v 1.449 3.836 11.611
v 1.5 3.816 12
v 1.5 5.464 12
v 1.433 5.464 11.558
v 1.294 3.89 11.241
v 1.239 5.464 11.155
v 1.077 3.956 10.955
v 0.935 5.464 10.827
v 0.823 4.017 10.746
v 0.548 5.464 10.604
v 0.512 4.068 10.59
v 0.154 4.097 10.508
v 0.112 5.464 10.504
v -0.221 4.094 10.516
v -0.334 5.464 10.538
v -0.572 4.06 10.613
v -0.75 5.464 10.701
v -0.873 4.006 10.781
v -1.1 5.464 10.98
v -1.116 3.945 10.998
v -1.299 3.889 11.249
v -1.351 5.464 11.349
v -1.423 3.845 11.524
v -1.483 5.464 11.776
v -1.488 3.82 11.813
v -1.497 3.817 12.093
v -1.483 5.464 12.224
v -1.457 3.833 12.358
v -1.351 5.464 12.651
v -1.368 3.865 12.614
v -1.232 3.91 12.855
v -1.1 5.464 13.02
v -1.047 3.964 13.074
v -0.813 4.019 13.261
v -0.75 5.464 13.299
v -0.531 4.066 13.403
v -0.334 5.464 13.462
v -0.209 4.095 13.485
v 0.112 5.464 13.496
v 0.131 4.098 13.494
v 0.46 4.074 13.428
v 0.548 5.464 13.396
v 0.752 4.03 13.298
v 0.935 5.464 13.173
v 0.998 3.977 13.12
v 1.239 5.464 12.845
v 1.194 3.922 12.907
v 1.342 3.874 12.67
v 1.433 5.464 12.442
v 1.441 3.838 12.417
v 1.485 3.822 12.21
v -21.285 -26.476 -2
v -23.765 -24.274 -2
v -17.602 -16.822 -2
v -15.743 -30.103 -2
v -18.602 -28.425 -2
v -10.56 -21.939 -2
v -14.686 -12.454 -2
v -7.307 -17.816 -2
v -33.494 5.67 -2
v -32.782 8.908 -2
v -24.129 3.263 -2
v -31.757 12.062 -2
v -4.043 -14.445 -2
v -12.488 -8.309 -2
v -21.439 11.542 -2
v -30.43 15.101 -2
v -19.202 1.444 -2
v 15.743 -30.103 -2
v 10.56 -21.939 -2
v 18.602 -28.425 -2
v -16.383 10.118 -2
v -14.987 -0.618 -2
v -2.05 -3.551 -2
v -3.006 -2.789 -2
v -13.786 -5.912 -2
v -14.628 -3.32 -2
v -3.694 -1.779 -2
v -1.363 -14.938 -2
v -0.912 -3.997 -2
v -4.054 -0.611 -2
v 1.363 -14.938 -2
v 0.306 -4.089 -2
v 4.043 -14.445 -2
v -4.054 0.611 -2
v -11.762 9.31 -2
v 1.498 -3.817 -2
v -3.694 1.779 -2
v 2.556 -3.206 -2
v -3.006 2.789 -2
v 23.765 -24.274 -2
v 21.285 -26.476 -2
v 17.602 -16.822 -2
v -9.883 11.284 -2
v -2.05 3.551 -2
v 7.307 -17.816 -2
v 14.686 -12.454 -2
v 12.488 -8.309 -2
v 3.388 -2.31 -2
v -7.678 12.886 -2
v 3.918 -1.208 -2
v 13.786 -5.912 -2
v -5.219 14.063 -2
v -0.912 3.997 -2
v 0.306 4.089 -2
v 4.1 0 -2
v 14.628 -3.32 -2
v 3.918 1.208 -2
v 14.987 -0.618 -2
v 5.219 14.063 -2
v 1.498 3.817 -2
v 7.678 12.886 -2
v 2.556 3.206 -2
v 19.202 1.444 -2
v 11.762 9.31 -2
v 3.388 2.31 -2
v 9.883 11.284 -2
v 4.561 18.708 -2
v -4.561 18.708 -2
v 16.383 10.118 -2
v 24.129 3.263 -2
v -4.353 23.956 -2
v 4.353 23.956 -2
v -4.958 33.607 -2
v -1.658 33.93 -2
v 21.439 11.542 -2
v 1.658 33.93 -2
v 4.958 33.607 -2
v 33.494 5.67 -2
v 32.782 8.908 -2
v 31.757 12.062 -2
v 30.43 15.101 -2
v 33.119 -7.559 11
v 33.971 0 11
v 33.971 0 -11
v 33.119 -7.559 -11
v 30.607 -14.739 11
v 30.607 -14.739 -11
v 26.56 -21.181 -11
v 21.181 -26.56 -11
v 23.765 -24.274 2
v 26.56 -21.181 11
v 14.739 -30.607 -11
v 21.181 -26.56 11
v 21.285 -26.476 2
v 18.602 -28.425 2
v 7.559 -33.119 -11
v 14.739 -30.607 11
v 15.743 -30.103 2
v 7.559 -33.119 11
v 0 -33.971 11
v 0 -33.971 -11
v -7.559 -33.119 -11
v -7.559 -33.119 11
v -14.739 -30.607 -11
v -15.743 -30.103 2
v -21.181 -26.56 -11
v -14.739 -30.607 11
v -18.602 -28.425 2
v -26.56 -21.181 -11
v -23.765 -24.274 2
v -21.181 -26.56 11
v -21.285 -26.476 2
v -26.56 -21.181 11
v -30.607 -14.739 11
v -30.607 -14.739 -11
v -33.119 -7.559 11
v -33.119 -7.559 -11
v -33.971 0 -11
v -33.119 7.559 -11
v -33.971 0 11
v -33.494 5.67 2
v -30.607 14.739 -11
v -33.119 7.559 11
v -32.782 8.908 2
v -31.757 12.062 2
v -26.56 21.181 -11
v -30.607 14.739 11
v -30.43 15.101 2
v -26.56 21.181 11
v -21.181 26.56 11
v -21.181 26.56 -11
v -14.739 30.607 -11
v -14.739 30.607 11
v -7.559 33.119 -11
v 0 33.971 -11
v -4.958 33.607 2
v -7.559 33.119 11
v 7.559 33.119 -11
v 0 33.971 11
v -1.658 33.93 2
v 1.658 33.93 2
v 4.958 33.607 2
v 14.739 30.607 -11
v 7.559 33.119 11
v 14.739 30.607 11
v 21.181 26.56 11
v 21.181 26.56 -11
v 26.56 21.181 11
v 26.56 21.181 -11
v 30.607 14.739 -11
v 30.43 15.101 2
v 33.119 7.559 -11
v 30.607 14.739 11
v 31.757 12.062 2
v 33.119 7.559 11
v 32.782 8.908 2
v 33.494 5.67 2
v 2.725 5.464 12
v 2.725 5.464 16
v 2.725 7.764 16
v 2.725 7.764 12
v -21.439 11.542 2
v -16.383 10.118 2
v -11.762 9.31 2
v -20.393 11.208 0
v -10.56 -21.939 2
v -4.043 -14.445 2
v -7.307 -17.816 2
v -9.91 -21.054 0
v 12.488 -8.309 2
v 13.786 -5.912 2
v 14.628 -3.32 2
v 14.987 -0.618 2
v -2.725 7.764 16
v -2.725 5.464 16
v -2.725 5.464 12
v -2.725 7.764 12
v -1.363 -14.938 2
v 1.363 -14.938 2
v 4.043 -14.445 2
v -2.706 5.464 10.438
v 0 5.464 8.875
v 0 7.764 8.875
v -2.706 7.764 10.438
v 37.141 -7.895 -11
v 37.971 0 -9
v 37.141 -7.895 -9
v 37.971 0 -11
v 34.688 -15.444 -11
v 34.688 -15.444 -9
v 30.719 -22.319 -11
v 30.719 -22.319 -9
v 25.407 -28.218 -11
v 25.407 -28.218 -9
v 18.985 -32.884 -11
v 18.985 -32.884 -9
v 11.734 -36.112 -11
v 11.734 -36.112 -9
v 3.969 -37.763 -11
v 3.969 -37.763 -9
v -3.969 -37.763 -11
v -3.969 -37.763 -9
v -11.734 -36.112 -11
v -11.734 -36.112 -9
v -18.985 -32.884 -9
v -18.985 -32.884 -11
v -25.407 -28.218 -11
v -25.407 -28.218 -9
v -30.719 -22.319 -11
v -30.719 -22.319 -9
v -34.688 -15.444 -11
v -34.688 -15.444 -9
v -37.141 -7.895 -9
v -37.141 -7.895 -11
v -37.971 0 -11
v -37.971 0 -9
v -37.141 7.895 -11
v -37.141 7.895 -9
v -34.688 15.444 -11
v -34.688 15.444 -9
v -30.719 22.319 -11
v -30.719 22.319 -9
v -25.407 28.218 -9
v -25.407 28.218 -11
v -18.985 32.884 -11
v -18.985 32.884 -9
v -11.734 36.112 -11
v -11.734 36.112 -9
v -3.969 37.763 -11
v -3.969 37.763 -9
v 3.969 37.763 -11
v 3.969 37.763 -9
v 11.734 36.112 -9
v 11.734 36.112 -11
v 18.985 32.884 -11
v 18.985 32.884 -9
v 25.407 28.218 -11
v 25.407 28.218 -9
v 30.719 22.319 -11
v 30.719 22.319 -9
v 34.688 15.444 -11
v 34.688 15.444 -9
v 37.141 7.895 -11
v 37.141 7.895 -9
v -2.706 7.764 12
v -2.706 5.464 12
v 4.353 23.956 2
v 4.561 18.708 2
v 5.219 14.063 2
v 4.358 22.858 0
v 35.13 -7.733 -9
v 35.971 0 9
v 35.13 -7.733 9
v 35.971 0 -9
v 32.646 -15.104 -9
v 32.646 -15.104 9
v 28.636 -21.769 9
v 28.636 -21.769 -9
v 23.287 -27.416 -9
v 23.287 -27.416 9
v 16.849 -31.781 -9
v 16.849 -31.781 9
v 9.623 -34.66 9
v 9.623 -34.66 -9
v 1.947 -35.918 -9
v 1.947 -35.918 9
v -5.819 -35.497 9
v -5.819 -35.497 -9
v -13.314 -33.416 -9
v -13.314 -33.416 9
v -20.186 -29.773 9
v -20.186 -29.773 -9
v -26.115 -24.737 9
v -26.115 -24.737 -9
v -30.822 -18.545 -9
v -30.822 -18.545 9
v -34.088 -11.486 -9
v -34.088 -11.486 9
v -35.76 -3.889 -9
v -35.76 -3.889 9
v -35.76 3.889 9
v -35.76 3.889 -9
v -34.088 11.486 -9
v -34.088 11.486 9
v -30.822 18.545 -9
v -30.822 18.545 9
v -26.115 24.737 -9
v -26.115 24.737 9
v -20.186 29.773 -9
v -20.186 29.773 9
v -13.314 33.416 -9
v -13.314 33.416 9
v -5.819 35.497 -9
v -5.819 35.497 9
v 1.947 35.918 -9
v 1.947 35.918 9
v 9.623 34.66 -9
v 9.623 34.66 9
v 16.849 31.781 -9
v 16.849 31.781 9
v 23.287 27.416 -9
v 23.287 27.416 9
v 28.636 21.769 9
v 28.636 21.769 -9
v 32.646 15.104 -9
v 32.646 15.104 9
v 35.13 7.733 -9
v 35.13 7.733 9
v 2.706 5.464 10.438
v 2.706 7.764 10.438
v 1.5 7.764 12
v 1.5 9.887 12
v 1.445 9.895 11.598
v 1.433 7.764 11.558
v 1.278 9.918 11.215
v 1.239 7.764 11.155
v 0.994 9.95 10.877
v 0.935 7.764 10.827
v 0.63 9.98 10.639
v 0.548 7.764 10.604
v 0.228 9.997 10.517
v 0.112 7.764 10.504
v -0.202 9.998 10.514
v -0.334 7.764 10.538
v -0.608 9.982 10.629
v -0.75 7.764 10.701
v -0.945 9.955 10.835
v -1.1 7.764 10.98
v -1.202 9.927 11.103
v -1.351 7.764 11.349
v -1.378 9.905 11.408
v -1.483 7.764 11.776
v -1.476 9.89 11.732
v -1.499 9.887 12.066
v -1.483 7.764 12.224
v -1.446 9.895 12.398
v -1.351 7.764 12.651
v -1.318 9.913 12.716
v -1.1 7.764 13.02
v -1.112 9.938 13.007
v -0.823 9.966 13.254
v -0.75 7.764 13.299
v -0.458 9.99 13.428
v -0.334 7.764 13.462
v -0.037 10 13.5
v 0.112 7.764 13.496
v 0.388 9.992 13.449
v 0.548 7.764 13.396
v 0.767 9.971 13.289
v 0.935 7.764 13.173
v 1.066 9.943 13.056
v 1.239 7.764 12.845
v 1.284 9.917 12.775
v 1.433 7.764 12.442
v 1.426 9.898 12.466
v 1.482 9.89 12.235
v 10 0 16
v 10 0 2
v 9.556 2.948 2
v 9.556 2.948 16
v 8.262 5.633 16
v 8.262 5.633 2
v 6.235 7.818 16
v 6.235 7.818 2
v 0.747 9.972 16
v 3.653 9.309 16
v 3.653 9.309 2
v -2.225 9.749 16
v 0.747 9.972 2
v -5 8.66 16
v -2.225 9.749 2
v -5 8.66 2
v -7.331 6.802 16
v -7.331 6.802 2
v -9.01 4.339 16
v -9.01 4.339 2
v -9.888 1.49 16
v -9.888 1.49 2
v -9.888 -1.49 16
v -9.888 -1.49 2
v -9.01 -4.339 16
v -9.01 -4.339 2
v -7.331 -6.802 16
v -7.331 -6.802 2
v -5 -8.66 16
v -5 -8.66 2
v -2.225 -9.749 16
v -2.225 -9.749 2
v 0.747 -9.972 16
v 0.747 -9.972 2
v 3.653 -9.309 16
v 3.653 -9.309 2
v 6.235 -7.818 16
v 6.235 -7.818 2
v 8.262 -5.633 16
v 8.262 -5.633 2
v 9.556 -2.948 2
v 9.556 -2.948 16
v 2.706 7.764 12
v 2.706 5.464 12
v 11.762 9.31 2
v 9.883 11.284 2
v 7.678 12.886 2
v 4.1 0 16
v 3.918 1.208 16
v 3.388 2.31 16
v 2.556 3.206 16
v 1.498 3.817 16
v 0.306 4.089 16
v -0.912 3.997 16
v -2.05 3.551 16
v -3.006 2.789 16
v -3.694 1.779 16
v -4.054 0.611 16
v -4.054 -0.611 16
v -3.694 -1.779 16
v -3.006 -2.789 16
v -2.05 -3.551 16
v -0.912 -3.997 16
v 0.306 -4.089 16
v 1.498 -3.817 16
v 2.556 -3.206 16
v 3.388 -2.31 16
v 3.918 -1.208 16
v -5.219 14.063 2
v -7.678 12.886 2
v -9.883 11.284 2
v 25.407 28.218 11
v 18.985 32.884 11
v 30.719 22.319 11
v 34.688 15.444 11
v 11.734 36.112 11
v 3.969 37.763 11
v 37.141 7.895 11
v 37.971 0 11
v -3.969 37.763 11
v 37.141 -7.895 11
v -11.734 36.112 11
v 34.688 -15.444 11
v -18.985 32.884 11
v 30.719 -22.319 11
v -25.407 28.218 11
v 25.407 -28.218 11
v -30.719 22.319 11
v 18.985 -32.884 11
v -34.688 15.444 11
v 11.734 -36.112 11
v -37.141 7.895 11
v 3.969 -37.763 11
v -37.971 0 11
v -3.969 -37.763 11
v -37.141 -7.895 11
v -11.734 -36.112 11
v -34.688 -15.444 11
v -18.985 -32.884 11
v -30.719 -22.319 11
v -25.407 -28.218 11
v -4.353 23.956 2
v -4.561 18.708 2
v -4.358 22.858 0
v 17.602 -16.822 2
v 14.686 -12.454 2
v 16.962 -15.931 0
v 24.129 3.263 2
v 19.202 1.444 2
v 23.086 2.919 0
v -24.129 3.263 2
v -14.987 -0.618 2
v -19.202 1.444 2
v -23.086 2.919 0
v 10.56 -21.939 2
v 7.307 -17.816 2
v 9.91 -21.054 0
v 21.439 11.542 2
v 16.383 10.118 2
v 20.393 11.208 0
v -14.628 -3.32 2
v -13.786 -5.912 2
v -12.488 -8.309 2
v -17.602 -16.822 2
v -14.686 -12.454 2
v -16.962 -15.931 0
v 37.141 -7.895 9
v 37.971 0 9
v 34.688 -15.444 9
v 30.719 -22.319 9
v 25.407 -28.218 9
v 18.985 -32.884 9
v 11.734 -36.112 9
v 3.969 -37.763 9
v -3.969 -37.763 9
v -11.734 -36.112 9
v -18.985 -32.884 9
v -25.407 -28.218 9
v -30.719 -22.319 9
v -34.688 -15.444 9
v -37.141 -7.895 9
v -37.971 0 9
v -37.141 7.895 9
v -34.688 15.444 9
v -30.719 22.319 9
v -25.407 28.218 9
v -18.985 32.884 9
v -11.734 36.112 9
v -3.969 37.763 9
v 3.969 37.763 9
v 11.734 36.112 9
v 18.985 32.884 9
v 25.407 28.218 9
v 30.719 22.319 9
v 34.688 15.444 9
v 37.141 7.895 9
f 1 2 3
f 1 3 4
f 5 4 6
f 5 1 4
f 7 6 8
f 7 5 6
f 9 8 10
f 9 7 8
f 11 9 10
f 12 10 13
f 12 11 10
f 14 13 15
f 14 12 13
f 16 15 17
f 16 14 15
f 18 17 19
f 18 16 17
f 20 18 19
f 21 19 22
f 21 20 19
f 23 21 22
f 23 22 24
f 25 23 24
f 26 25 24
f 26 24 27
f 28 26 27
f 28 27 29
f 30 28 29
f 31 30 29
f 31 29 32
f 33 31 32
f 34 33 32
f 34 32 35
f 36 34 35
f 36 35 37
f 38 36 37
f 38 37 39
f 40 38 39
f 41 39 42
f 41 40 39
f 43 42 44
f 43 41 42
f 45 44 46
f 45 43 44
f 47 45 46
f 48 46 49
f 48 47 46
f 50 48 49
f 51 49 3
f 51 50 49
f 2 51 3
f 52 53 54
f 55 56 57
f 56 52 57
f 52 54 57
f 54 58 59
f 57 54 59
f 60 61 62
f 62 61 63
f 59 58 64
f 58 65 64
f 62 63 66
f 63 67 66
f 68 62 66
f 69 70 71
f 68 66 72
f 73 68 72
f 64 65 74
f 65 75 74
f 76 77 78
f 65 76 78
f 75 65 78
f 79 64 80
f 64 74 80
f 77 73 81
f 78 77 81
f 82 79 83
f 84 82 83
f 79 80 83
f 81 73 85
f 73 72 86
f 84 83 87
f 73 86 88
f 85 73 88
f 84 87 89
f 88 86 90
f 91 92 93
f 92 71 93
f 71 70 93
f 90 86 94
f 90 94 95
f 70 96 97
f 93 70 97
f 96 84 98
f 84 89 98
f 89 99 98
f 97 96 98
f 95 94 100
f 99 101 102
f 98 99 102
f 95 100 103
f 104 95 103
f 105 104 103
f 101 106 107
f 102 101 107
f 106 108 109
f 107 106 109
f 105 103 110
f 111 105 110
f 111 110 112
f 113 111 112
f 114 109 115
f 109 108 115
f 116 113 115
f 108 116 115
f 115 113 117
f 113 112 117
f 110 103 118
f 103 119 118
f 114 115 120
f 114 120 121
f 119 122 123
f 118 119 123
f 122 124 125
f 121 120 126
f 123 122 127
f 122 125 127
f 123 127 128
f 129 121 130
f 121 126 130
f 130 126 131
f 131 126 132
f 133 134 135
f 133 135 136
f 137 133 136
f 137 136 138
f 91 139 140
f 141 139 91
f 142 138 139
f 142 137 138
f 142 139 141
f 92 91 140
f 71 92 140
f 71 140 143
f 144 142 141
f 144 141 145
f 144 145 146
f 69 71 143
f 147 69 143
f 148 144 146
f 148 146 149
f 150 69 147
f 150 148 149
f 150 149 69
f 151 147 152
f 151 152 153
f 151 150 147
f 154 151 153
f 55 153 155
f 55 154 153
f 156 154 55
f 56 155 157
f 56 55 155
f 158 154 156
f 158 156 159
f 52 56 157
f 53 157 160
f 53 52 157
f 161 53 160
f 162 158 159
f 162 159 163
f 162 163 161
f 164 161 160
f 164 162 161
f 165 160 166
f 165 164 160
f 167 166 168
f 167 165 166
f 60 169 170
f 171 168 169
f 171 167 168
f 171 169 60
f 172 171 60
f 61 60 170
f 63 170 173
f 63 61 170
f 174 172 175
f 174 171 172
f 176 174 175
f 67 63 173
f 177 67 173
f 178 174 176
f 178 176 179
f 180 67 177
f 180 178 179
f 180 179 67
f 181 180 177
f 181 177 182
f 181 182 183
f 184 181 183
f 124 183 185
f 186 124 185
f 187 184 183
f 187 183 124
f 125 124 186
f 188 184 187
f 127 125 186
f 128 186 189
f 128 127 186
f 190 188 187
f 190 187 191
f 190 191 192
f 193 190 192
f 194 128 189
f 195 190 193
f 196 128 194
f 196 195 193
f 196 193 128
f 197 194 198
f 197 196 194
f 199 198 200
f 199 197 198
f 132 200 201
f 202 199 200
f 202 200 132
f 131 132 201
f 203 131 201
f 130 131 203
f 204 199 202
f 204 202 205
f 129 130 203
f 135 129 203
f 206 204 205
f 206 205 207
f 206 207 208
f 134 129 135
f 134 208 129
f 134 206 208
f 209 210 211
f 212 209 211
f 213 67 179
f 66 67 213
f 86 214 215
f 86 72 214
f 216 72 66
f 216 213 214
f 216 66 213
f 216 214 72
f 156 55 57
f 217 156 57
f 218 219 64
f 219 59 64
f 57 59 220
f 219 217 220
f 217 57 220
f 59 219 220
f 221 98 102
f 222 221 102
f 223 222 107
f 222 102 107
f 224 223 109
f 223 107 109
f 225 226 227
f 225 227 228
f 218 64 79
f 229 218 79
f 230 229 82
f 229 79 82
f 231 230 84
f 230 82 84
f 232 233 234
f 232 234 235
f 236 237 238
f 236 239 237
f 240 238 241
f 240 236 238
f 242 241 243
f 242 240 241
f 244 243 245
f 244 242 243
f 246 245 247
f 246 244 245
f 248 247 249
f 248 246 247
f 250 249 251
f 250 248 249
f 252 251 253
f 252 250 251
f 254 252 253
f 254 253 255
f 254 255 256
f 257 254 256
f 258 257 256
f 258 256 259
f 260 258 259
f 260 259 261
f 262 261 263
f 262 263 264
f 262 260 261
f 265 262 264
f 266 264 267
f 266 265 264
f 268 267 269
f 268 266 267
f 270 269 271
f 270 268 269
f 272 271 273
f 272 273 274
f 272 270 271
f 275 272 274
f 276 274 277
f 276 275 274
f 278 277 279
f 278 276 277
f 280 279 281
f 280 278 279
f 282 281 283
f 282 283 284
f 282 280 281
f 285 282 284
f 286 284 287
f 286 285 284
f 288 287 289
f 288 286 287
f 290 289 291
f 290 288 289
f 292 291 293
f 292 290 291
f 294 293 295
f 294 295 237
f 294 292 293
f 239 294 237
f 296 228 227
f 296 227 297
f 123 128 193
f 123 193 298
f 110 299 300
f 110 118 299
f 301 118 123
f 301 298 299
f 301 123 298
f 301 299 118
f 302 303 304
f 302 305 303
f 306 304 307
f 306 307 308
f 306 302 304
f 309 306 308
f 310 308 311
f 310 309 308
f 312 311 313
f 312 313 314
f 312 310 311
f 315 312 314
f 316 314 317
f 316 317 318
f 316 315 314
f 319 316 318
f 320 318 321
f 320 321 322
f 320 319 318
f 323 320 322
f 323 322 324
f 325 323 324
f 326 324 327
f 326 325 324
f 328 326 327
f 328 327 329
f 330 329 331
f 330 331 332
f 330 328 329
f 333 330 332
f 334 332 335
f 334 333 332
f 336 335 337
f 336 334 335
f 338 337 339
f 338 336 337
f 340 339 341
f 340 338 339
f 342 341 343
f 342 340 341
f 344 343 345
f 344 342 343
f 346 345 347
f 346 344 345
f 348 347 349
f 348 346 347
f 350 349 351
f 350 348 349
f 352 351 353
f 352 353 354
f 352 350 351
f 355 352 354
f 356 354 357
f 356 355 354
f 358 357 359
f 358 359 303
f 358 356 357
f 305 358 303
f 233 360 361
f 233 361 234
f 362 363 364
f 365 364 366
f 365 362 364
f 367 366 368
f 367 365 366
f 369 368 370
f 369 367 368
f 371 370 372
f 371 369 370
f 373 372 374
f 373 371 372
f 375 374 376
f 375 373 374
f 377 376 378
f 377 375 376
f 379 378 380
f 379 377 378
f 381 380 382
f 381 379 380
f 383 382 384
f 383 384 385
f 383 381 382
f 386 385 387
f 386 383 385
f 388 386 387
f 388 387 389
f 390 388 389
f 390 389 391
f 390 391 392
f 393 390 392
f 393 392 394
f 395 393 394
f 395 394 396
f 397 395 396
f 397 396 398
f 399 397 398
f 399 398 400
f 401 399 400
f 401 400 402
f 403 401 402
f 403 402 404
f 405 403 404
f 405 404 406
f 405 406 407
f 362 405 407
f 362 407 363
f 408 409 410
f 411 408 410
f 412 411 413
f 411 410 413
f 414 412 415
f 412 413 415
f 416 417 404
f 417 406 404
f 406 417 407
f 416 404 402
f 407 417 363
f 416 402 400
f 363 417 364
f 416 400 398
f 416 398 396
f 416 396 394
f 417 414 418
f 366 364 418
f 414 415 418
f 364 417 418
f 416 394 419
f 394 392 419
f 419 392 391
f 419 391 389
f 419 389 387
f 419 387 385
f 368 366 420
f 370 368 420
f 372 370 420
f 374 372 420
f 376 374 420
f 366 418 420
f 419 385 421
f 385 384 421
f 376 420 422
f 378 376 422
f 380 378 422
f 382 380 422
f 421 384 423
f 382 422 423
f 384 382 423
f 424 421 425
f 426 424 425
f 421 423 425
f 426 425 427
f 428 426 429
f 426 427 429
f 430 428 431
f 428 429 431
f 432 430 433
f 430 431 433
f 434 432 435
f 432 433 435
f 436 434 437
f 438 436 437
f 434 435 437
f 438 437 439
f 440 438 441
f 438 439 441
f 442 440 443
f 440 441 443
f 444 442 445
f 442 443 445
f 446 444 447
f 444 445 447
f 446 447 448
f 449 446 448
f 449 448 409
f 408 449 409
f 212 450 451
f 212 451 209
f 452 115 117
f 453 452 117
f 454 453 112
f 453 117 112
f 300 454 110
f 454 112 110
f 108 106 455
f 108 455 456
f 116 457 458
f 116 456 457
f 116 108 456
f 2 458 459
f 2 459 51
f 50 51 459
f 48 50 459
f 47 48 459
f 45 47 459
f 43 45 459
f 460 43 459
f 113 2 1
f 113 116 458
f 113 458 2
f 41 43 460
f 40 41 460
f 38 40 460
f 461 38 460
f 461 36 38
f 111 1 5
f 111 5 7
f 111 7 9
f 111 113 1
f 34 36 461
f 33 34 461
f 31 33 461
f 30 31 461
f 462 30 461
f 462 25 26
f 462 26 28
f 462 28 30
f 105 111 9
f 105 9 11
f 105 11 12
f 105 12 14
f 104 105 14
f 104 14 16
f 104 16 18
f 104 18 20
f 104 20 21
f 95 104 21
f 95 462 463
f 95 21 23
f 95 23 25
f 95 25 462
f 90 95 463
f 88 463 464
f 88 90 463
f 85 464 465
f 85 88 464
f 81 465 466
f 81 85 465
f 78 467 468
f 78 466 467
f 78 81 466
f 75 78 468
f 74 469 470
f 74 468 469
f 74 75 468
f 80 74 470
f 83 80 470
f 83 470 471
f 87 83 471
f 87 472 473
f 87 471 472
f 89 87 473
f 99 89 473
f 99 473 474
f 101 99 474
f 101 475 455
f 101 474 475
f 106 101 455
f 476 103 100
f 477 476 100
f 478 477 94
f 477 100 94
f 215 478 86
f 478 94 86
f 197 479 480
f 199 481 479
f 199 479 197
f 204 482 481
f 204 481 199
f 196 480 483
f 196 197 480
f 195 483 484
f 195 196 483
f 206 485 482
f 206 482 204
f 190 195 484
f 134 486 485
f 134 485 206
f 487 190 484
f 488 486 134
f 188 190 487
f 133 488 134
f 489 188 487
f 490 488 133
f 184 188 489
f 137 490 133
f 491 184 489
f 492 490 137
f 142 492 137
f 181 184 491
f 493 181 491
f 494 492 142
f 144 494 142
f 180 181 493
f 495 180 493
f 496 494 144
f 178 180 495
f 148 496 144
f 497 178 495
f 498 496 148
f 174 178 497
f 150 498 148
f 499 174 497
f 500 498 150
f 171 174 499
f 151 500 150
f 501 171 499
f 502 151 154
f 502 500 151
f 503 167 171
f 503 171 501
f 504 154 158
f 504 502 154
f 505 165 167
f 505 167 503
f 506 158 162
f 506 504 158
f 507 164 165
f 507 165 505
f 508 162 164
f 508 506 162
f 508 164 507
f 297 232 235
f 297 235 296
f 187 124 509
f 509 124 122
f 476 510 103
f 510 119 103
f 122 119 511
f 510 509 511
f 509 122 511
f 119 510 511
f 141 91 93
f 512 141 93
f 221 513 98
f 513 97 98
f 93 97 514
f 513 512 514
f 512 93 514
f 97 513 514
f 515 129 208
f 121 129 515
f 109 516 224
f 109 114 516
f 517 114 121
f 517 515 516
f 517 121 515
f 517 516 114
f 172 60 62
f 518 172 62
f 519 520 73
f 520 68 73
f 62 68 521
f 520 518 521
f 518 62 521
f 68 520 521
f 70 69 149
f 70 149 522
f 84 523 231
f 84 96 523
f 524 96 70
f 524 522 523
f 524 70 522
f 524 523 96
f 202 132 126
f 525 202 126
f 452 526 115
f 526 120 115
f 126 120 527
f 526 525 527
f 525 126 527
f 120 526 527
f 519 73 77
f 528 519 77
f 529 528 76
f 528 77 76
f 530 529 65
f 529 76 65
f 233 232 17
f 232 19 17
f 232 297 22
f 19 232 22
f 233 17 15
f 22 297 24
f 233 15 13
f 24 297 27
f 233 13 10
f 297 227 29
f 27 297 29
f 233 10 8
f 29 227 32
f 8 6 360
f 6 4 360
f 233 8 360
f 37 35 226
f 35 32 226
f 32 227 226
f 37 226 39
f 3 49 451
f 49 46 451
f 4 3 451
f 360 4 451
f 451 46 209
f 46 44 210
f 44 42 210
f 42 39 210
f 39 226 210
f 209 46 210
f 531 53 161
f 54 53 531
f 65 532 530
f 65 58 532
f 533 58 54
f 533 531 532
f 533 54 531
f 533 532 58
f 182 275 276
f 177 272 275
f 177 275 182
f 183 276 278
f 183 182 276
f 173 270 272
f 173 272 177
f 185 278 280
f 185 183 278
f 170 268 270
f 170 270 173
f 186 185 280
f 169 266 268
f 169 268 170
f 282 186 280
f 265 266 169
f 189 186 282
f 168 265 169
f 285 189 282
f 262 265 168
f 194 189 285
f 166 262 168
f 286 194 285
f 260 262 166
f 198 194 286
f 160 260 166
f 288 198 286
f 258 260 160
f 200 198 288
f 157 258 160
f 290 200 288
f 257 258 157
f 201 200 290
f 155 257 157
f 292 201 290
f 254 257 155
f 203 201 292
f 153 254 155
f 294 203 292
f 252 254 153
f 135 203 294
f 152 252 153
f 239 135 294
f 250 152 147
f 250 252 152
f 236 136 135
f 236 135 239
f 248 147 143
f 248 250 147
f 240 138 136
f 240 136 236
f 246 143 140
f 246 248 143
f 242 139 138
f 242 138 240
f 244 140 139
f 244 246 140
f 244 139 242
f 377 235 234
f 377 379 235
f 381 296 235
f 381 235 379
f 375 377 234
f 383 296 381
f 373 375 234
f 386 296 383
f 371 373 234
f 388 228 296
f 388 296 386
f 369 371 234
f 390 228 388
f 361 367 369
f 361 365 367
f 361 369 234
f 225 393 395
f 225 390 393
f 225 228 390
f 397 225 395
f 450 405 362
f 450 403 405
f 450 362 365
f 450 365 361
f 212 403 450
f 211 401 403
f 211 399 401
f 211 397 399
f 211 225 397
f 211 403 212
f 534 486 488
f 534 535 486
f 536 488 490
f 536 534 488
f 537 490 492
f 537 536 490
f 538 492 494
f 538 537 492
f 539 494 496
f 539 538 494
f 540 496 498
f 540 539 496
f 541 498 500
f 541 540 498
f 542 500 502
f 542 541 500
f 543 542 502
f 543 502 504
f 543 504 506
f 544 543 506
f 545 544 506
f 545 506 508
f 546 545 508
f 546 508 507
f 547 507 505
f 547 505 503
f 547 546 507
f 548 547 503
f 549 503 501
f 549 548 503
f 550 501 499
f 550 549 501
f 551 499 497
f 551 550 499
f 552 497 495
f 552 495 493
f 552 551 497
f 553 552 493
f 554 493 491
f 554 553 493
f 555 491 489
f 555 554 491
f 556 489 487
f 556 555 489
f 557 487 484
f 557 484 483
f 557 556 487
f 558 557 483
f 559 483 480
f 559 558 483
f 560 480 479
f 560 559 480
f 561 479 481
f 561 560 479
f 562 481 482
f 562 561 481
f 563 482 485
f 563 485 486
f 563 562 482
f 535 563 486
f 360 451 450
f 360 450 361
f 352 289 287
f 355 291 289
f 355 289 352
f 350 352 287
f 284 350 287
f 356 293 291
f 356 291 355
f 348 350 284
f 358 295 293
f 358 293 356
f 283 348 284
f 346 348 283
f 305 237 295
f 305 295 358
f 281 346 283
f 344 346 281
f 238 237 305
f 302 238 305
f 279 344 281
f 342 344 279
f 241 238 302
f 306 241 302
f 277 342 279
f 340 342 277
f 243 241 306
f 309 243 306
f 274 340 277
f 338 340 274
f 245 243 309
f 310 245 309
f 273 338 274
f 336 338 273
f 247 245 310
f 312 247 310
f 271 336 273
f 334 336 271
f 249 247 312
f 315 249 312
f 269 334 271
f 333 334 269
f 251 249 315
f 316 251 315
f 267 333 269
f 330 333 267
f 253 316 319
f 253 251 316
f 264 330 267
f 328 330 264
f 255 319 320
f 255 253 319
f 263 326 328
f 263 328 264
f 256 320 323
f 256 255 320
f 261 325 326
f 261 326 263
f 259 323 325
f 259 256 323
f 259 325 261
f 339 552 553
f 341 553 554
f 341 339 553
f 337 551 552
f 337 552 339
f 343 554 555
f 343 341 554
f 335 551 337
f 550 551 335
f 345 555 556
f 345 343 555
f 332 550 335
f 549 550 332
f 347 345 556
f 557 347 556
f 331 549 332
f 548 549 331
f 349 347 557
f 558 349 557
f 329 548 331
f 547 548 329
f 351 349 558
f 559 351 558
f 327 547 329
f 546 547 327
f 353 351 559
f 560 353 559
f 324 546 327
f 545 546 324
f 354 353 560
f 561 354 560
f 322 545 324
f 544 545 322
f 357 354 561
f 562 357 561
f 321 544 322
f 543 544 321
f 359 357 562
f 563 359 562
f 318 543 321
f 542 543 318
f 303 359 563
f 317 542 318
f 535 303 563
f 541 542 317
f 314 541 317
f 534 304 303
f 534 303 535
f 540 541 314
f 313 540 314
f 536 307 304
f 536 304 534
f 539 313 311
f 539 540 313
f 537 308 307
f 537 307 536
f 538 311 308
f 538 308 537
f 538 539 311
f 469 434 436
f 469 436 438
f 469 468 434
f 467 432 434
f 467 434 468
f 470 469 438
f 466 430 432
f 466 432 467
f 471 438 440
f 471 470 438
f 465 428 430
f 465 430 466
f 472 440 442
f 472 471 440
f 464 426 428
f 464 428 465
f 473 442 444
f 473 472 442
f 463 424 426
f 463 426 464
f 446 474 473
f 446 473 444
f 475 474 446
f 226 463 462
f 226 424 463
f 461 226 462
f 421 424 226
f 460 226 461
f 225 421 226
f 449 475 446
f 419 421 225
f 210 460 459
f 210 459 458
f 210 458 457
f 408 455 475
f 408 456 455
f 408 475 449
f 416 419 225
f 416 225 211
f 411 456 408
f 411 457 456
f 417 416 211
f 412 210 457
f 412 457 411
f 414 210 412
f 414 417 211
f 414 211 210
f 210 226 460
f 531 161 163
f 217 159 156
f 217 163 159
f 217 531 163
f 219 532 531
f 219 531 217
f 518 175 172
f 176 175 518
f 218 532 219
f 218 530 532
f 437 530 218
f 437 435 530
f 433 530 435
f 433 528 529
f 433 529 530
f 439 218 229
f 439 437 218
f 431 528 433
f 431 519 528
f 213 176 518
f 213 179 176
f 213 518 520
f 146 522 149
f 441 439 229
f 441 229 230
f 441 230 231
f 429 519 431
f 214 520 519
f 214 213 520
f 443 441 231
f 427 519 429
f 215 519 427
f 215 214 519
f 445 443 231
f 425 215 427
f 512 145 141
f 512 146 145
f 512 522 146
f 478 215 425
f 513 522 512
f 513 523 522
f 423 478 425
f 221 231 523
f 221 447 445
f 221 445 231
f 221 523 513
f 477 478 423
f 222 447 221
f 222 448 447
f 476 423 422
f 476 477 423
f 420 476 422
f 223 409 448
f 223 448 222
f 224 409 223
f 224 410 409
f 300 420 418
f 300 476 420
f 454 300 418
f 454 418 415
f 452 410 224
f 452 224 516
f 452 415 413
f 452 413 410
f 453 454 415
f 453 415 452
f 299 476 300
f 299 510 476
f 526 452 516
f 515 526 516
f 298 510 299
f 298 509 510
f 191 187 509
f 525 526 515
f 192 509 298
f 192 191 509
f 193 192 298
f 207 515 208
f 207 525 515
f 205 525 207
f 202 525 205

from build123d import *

# Parameters (mm, degrees)
BOSS_EXTRUDE1_DEPTH      = 2
BOSS_EXTRUDE1_DEPTH_BACK = 2
SKETCH3_R                = 15
BOSS_EXTRUDE3_DEPTH      = 2
BOSS_EXTRUDE3_DEPTH_BACK = 2
SKETCH12_R               = 10
BOSS_EXTRUDE4_DEPTH      = 16
CUT_EXTRUDE1_DEPTH       = 57.031941152
CUT_EXTRUDE1_DEPTH_BACK  = 57.031941152
SKETCH7_R                = 4.1
SKETCH13_W               = 5.45
SKETCH13_H               = 2.3
CUT_EXTRUDE2_DEPTH       = 4
CUT_EXTRUDE3_DEPTH       = 6
CUT_EXTRUDE3_DEPTH_BACK  = 4
SKETCH14_R               = 1.5
CUT_EXTRUDE4_DEPTH       = 2.3


with BuildPart() as part:
    # Sketch2 → Revolve1 (revolve)
    with BuildSketch(Plane(origin=(0, 0, 0), x_dir=(0, 0, -1), z_dir=(1, 0, 0)), mode=Mode.PRIVATE) as revolve1_sk:
        Polygon((-9, 35.970899576), (9, 35.970899576), (9, 37.970899576), (11, 37.970899576), (11, 33.970899576), (-11, 33.970899576), (-11, 37.970899576), (-9, 37.970899576), align=None)
    revolve(revolve1_sk.sketch.rotate(Axis((0, 0, 10), (0, 0, -1)), 90), axis=Axis((0, 0, 10), (0, 0, -1)))



with BuildPart() as body_2:
    # Sketch3 → Boss-Extrude1 (new, two sides: drawn at the far end of the back side and taken through both)
    with BuildSketch(Plane.XY.offset(-BOSS_EXTRUDE1_DEPTH_BACK)):
        Circle(SKETCH3_R)
    extrude(amount=BOSS_EXTRUDE1_DEPTH + BOSS_EXTRUDE1_DEPTH_BACK)


with BuildPart() as part_1:
    add(part.part)

    add(body_2.part)  # Boss-Extrude3 merges body 2
    # Sketch11 → Boss-Extrude3 (add, two sides: drawn at the far end of the back side and taken through both)
    with BuildSketch(Plane.XY.offset(-BOSS_EXTRUDE3_DEPTH_BACK)):
        with BuildLine():
            Line((5, 33.970899576), (-5, 33.970899576))
            add(Edge.make_bspline(
                [(-5, 33.970899576), (-3.602966052, 22.002598894), (-5.219370498, 14.062651656)],
                knots=[0, 0, 0, 0.277878322, 0.277878322, 0.277878322], degree=2))
            add(Edge.make_bspline(
                [(-5.219370498, 14.062651656), (-3.623415853, 14.571458155), (-2.092021841, 14.791258924)],
                knots=[0, 0, 0, 0.220994238, 0.220994238, 0.220994238], degree=2))
            add(Edge.make_bspline(
                [(-2.092021841, 14.791258924), (0.275566205, 15.158843416), (2.712697031, 14.915974307), (5.219370636, 14.062651605)],
                knots=[0.31222072, 0.31222072, 0.31222072, 0.31222072, 0.753229942, 0.753229942, 0.753229942, 0.753229942], degree=3))
            add(Edge.make_bspline(
                [(5, 33.970899576), (3.602966194, 22.002598839), (5.219370636, 14.062651605)],
                knots=[0, 0, 0, 0.277878321, 0.277878321, 0.277878321], degree=2))
        make_face()
        with BuildLine():
            Line((33.853330378, 5.742302702), (30.763160434, 15.252867865))
            add(Edge.make_bspline(
                [(30.763160434, 15.252867865), (19.812337313, 10.225801321), (11.76150231, 9.309514671)],
                knots=[0, 0, 0, 0.277878322, 0.277878322, 0.277878322], degree=2))
            add(Edge.make_bspline(
                [(11.76150231, 9.309514671), (12.738583154, 7.948901461), (13.420852883, 6.56038138)],
                knots=[0, 0, 0, 0.220994238, 0.220994238, 0.220994238], degree=2))
            add(Edge.make_bspline(
                [(13.420852883, 6.56038138), (14.50207145, 4.422261196), (15.024204045, 2.029361361), (14.987250672, -0.618318123)],
                knots=[0.31222072, 0.31222072, 0.31222072, 0.31222072, 0.753229942, 0.753229942, 0.753229942, 0.753229942], degree=3))
            add(Edge.make_bspline(
                [(33.853330378, 5.742302702), (22.039092786, 3.372552484), (14.987250672, -0.618318123)],
                knots=[0, 0, 0, 0.277878321, 0.277878321, 0.277878321], degree=2))
        make_face()
        with BuildLine():
            Line((15.922508806, -30.421961333), (24.01267875, -24.54410881))
            add(Edge.make_bspline(
                [(24.01267875, -24.54410881), (15.847663908, -15.682706115), (12.488378684, -8.309055171)],
                knots=[0, 0, 0, 0.277878322, 0.277878322, 0.277878322], degree=2))
            add(Edge.make_bspline(
                [(12.488378684, -8.309055171), (11.496293211, -9.658766879), (10.386565081, -10.736720252)],
                knots=[0, 0, 0, 0.220994238, 0.220994238, 0.220994238], degree=2))
            add(Edge.make_bspline(
                [(10.386565081, -10.736720252), (8.687206859, -12.42573569), (6.572771723, -13.661760011), (4.043259677, -14.444793221)],
                knots=[0.31222072, 0.31222072, 0.31222072, 0.31222072, 0.753229942, 0.753229942, 0.753229942, 0.753229942], degree=3))
            add(Edge.make_bspline(
                [(15.922508806, -30.421961333), (10.017942228, -19.918246775), (4.043259677, -14.444793221)],
                knots=[0, 0, 0, 0.277878321, 0.277878321, 0.277878321], degree=2))
        make_face()
        with BuildLine():
            Line((-24.01267875, -24.54410881), (-15.922508806, -30.421961333))
            add(Edge.make_bspline(
                [(-15.922508806, -30.421961333), (-10.017942375, -19.918246736), (-4.043259819, -14.444793181)],
                knots=[0, 0, 0, 0.277878322, 0.277878322, 0.277878322], degree=2))
            add(Edge.make_bspline(
                [(-4.043259819, -14.444793181), (-5.633483205, -13.918347682), (-7.001602636, -13.196039424)],
                knots=[0, 0, 0, 0.220994238, 0.220994238, 0.220994238], degree=2))
            add(Edge.make_bspline(
                [(-7.001602636, -13.196039424), (-9.133082344, -12.101788187), (-10.96200772, -10.472793393), (-12.488378766, -8.309055048)],
                knots=[0.31222072, 0.31222072, 0.31222072, 0.31222072, 0.753229942, 0.753229942, 0.753229942, 0.753229942], degree=3))
            add(Edge.make_bspline(
                [(-24.01267875, -24.54410881), (-15.847663991, -15.682705988), (-12.488378766, -8.309055048)],
                knots=[0, 0, 0, 0.277878321, 0.277878321, 0.277878321], degree=2))
        make_face()
        with BuildLine():
            Line((-30.763160434, 15.252867865), (-33.853330378, 5.742302702))
            add(Edge.make_bspline(
                [(-33.853330378, 5.742302702), (-22.039092794, 3.372552636), (-14.987250678, -0.618317975)],
                knots=[0, 0, 0, 0.277878322, 0.277878322, 0.277878322], degree=2))
            add(Edge.make_bspline(
                [(-14.987250678, -0.618317975), (-14.977977306, 1.056754944), (-14.713793486, 2.581119372)],
                knots=[0, 0, 0, 0.220994238, 0.220994238, 0.220994238], degree=2))
            add(Edge.make_bspline(
                [(-14.713793486, 2.581119372), (-14.33176217, 4.946419265), (-13.347665078, 7.189217736), (-11.761502219, 9.309514786)],
                knots=[0.31222072, 0.31222072, 0.31222072, 0.31222072, 0.753229942, 0.753229942, 0.753229942, 0.753229942], degree=3))
            add(Edge.make_bspline(
                [(-30.763160434, 15.252867865), (-19.812337217, 10.225801439), (-11.761502219, 9.309514786)],
                knots=[0, 0, 0, 0.277878321, 0.277878321, 0.277878321], degree=2))
        make_face()
    extrude(amount=BOSS_EXTRUDE3_DEPTH + BOSS_EXTRUDE3_DEPTH_BACK)

    # Sketch12 → Boss-Extrude4 (add)
    with BuildSketch(Plane.XY):
        Circle(SKETCH12_R)
    extrude(amount=BOSS_EXTRUDE4_DEPTH)

    # Sketch7 → Cut-Extrude1 (cut, two sides: drawn at the far end of the back side and taken through both)
    with BuildSketch(Plane.XY.offset(-CUT_EXTRUDE1_DEPTH_BACK)):
        Circle(SKETCH7_R)
    extrude(amount=CUT_EXTRUDE1_DEPTH + CUT_EXTRUDE1_DEPTH_BACK, mode=Mode.SUBTRACT)

    # Sketch13 → Cut-Extrude2 (cut)
    with BuildSketch(Plane.XY.offset(16)):
        with Locations((0, 6.614053633)):
            Rectangle(SKETCH13_W, SKETCH13_H)
    extrude(amount=-CUT_EXTRUDE2_DEPTH, mode=Mode.SUBTRACT)

    # Sketch14 → Cut-Extrude3 (cut, two sides: drawn at the far end of the back side and taken through both)
    with BuildSketch(Plane(origin=(0, 5.464053633, 0), x_dir=(1, 0, 0), z_dir=(0, 1, 0)).offset(-CUT_EXTRUDE3_DEPTH_BACK)):
        with Locations((0, -12)):
            Circle(SKETCH14_R)
    extrude(amount=CUT_EXTRUDE3_DEPTH + CUT_EXTRUDE3_DEPTH_BACK, mode=Mode.SUBTRACT)

    # Sketch16 → Cut-Extrude4 (cut)
    with BuildSketch(Plane(origin=(0, 5.464053633, 0), x_dir=(1, 0, 0), z_dir=(0, 1, 0))):
        Polygon((0, -15.124596023), (2.705979533, -13.562298012), (2.705979533, -10.437701988), (0, -8.875403977), (-2.705979533, -10.437701988), (-2.705979533, -13.562298012), align=None)
    extrude(amount=CUT_EXTRUDE4_DEPTH, mode=Mode.SUBTRACT)


solid = part_1.part
